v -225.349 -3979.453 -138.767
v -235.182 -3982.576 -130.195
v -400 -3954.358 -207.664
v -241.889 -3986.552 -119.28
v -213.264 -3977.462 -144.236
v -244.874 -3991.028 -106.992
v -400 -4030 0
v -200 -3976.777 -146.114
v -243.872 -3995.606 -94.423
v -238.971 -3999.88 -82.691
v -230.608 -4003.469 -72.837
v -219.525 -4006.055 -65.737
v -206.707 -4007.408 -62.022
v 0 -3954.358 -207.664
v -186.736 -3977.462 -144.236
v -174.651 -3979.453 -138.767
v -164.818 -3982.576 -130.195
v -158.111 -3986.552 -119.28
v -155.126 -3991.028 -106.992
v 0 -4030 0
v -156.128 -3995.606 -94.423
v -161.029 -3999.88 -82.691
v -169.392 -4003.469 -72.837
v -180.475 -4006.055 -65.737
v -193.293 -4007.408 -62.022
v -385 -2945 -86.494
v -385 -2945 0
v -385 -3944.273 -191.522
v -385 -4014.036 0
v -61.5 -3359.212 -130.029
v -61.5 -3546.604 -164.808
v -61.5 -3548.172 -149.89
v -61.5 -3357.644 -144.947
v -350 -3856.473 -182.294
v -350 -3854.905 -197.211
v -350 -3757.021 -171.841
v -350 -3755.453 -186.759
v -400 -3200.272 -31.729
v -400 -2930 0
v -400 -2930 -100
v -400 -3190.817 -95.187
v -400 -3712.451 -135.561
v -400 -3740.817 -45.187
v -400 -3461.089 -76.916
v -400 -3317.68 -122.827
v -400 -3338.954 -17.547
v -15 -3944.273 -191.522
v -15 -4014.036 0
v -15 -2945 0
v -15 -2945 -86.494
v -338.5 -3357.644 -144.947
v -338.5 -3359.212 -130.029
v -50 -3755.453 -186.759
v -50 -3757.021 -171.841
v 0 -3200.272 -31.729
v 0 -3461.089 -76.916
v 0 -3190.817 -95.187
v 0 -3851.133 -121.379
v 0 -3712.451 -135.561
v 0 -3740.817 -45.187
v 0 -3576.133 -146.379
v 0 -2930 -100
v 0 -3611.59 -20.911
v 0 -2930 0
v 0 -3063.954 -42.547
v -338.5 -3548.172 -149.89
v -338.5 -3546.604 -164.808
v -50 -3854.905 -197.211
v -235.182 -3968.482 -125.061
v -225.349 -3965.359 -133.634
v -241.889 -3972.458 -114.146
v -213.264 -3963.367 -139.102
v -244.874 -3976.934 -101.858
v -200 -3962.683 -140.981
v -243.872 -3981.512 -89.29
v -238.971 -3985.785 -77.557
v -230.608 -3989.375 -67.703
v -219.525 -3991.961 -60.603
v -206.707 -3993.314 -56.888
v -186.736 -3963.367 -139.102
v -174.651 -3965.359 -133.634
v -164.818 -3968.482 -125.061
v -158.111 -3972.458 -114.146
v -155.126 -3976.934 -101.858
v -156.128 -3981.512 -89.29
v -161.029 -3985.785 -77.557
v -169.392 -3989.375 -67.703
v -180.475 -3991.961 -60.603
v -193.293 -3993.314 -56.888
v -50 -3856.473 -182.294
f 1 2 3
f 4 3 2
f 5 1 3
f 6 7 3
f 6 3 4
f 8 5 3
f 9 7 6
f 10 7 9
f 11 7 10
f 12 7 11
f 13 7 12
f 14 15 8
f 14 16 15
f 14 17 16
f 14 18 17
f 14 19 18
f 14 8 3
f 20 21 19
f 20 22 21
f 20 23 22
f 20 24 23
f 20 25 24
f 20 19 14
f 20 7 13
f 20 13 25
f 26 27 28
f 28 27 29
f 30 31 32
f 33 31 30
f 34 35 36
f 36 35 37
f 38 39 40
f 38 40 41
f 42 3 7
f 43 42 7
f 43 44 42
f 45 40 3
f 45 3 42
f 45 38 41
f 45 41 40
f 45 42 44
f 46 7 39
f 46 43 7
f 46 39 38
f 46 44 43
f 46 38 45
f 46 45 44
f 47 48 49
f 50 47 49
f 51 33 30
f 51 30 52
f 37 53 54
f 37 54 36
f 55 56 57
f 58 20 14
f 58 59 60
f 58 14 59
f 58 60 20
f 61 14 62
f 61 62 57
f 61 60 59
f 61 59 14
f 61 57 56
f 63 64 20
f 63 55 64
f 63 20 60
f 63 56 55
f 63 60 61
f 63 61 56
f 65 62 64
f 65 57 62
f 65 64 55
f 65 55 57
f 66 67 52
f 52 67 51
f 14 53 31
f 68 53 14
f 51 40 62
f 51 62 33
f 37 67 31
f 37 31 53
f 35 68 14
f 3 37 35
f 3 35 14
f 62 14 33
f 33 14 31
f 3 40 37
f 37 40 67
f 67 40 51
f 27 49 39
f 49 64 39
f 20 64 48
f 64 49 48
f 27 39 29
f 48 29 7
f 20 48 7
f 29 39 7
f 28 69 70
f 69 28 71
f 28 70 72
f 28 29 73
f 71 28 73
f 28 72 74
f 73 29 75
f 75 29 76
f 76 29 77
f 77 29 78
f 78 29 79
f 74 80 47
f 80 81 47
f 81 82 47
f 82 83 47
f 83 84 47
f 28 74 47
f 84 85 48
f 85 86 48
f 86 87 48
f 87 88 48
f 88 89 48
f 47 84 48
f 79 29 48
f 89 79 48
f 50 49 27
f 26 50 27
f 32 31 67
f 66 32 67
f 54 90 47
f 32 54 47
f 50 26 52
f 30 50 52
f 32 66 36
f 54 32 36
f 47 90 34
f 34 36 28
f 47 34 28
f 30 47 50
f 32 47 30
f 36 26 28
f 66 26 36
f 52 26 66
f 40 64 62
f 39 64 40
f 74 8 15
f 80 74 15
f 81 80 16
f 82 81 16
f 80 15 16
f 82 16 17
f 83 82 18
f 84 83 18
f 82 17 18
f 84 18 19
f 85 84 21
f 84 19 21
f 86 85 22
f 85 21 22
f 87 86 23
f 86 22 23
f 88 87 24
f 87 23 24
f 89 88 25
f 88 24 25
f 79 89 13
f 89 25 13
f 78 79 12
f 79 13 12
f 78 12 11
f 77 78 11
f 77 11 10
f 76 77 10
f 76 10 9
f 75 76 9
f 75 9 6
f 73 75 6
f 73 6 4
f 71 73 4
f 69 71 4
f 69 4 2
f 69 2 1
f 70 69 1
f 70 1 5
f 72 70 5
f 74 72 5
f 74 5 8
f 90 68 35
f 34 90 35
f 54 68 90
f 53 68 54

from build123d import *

# Parameters (mm, degrees)
SKETCH6_W          = 300
SKETCH6_H          = 100
SKETCH6_W_2        = 277
SKETCH6_H_2        = 190
CUT_EXTRUDE1_DEPTH = 50
SHELL1_T           = -15
SKETCH7_R          = 45
CUT_EXTRUDE2_DEPTH = 50


with BuildPart() as part:
    # Sketch4 → Loft1 section 0
    with BuildSketch(Plane(origin=(0, -21.618180384, 205.683247011), x_dir=(1, 0, 0), z_dir=(0, 0.10452846326765355, -0.9945218953682733))):
        with BuildLine():
            Line((0, 2924.401999756), (-400, 2924.401999756))
            Line((-400, 2924.401999756), (-400, 3954.401999756))
            Line((-400, 3954.401999756), (0, 3954.401999756))
            Line((0, 3954.401999756), (0, 2924.401999756))
        make_face()
    # Sketch2 → Loft1 section 1
    with BuildSketch(Plane.XY):
        with BuildLine():
            Line((0, -2930), (-400, -2930))
            Line((-400, -2930), (-400, -4030))
            Line((-400, -4030), (0, -4030))
            Line((0, -4030), (0, -2930))
        make_face()
    loft()

    # Sketch6 → Cut-Extrude1 (cut)
    with BuildSketch(Plane(origin=(0, -21.618180384, 205.683247011), x_dir=(-1, 0, 0), z_dir=(0, 0.1045284632676537, -0.9945218953682733))):
        with Locations((200, -3804.401999756)):
            Rectangle(SKETCH6_W, SKETCH6_H)
        with Locations((200, -3449.401999756)):
            Rectangle(SKETCH6_W_2, SKETCH6_H_2)
    extrude(amount=-CUT_EXTRUDE1_DEPTH, mode=Mode.SUBTRACT)

    # Shell1
    shell1_openings = [part.faces().sort_by_distance(p)[0] for p in [
        (-200, -3480, 0),
        (-200, -3857.518574274, -172.348423455),
        (-350, -3807.792479506, -167.122000291),
        (-200, -3758.066384737, -161.895577128),
        (-50, -3807.792479506, -167.122000291),
        (-61.5, -3454.73720665, -130.014395831),
        (-200, -3549.21678671, -139.944599842),
        (-338.5, -3454.73720665, -130.014395831),
        (-200, -3360.25762659, -120.084191821),
        (-200, -3810.405691087, -142.258952907),
        (-200, -3457.350418232, -105.151348447),
    ]]
    offset(amount=SHELL1_T, openings=shell1_openings, kind=Kind.INTERSECTION)

    # Sketch7 → Cut-Extrude2 (cut)
    with BuildSketch(Plane(origin=(0, -3557.931546215, -1295.988905699), x_dir=(1, 0, 0), z_dir=(0, -0.9396070592858665, -0.34225513018823583))):
        with Locations(Location((-200, 1268.782237568, 0), (0, 0, 270))):
            Circle(SKETCH7_R)
    extrude(amount=-CUT_EXTRUDE2_DEPTH, mode=Mode.SUBTRACT)


solid = part.part
